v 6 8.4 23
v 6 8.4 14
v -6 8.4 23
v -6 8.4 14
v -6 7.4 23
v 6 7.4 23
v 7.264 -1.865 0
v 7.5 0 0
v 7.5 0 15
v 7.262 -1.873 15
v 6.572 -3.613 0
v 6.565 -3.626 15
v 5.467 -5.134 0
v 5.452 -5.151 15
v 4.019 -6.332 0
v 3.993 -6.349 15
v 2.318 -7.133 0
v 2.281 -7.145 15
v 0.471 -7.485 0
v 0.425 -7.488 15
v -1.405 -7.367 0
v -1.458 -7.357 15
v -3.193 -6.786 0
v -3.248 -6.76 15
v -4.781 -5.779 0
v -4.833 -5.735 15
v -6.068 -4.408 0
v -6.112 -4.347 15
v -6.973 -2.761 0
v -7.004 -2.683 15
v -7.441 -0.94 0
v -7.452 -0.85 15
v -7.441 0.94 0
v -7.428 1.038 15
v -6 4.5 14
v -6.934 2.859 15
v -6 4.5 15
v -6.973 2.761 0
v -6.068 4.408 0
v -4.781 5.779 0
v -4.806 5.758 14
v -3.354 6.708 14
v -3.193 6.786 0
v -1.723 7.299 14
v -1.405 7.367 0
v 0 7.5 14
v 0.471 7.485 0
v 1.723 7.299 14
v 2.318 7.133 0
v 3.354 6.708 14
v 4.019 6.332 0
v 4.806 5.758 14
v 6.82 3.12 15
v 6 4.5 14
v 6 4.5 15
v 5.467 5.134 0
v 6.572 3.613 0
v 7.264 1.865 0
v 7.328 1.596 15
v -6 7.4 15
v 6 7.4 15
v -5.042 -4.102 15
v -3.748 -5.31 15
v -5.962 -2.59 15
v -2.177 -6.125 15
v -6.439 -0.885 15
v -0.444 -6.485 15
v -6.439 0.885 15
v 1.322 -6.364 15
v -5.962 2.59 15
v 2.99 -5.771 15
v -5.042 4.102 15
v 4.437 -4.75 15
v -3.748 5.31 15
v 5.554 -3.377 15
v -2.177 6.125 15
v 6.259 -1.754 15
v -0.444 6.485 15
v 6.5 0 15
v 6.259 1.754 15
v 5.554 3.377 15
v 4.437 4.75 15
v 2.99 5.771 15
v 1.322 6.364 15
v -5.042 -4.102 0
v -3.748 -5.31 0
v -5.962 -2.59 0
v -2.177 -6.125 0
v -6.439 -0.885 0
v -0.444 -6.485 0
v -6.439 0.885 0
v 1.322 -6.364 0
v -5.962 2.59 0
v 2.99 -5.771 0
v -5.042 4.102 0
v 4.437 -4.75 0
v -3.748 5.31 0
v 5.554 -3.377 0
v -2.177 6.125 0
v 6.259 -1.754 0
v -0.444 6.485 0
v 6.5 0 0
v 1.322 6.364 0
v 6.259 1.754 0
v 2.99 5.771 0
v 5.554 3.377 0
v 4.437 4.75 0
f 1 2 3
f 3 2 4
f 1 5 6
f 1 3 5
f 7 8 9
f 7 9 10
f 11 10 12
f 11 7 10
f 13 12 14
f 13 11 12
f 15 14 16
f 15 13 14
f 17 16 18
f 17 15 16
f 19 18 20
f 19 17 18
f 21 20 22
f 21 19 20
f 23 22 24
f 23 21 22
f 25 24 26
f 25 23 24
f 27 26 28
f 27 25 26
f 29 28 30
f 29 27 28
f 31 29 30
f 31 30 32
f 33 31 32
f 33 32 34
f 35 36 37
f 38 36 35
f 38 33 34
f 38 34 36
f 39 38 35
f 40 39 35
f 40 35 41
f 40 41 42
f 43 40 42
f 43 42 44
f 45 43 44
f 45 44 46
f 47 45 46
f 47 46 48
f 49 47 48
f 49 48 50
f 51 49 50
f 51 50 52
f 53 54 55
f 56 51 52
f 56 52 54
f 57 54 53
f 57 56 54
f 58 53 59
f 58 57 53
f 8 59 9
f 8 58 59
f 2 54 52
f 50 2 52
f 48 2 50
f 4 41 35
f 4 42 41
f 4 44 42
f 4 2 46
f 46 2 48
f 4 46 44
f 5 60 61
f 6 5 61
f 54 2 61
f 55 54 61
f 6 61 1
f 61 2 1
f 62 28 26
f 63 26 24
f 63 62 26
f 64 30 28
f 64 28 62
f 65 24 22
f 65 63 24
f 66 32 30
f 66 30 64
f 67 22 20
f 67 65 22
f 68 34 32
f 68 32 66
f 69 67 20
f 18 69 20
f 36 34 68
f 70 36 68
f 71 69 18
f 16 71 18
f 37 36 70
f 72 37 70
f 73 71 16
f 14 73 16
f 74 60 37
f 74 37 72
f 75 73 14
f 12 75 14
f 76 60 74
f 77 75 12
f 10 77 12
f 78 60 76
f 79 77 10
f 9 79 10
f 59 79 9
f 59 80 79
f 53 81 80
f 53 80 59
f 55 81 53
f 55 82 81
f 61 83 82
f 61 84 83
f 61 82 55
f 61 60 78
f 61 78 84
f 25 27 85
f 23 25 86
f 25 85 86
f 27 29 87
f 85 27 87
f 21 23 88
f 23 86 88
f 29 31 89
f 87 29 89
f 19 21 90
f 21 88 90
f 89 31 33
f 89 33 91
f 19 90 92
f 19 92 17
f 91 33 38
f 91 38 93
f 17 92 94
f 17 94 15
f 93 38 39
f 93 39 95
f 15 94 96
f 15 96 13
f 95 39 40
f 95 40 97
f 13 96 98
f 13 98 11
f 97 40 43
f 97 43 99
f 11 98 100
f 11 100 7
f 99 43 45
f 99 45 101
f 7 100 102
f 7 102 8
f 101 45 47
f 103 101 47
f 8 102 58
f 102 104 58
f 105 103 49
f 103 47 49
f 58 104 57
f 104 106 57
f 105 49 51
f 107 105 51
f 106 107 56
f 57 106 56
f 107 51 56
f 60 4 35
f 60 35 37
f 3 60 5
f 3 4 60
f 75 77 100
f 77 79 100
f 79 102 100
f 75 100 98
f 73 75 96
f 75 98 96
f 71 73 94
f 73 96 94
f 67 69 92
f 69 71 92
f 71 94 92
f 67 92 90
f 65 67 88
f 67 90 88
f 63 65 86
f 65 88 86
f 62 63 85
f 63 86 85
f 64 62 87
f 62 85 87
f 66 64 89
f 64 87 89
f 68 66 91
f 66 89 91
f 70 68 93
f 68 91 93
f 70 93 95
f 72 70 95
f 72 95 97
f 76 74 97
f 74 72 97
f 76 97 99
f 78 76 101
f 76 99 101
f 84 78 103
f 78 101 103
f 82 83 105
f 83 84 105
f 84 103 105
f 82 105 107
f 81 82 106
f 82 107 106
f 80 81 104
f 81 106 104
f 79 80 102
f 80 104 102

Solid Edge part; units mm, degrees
sketch "Sketch1" plane through (0, 0, 0) normal (0, 0, 1) x (1, 0, 0)
  circle A0 centre (0, 0) radius 6.5
  circle A1 centre (0, 0) radius 7.5
  dimension "D1" = 15
extrude "Protrusion1" add sketch "Sketch1" along normal blind 15
sketch "Sketch2" plane through (0, 0, 15) normal (0, 0, 1) x (1, 0, 0)
  line L0 (0, 7.4) -> (6, 7.4)
  line L1 (6, 7.4) -> (6, 8.4)
  line L2 (6, 8.4) -> (-6, 8.4)
  line L3 (-6, 8.4) -> (-6, 7.4)
  line L4 (-6, 7.4) -> (0, 7.4)
extrude "ExtrudedProtrusion_2" add sketch "Sketch2" along normal blind 8 and the other way blind 1
sketch "Sketch3" plane through (0, 7.4, 18.5) normal (0, -1, 0) x (-1, 0, 0)
  line L0 (-6, 4.5) -> (6, 4.5)
  line L1 (6, 4.5) -> (6, 3.5)
  line L2 (6, 3.5) -> (-6, 3.5)
  line L3 (-6, 4.5) -> (-6, 3.5)
extrude "Protrusion2" add sketch "Sketch3" along normal up to next
extrude "Cutout1" [suppressed]
properties material "Copper"
